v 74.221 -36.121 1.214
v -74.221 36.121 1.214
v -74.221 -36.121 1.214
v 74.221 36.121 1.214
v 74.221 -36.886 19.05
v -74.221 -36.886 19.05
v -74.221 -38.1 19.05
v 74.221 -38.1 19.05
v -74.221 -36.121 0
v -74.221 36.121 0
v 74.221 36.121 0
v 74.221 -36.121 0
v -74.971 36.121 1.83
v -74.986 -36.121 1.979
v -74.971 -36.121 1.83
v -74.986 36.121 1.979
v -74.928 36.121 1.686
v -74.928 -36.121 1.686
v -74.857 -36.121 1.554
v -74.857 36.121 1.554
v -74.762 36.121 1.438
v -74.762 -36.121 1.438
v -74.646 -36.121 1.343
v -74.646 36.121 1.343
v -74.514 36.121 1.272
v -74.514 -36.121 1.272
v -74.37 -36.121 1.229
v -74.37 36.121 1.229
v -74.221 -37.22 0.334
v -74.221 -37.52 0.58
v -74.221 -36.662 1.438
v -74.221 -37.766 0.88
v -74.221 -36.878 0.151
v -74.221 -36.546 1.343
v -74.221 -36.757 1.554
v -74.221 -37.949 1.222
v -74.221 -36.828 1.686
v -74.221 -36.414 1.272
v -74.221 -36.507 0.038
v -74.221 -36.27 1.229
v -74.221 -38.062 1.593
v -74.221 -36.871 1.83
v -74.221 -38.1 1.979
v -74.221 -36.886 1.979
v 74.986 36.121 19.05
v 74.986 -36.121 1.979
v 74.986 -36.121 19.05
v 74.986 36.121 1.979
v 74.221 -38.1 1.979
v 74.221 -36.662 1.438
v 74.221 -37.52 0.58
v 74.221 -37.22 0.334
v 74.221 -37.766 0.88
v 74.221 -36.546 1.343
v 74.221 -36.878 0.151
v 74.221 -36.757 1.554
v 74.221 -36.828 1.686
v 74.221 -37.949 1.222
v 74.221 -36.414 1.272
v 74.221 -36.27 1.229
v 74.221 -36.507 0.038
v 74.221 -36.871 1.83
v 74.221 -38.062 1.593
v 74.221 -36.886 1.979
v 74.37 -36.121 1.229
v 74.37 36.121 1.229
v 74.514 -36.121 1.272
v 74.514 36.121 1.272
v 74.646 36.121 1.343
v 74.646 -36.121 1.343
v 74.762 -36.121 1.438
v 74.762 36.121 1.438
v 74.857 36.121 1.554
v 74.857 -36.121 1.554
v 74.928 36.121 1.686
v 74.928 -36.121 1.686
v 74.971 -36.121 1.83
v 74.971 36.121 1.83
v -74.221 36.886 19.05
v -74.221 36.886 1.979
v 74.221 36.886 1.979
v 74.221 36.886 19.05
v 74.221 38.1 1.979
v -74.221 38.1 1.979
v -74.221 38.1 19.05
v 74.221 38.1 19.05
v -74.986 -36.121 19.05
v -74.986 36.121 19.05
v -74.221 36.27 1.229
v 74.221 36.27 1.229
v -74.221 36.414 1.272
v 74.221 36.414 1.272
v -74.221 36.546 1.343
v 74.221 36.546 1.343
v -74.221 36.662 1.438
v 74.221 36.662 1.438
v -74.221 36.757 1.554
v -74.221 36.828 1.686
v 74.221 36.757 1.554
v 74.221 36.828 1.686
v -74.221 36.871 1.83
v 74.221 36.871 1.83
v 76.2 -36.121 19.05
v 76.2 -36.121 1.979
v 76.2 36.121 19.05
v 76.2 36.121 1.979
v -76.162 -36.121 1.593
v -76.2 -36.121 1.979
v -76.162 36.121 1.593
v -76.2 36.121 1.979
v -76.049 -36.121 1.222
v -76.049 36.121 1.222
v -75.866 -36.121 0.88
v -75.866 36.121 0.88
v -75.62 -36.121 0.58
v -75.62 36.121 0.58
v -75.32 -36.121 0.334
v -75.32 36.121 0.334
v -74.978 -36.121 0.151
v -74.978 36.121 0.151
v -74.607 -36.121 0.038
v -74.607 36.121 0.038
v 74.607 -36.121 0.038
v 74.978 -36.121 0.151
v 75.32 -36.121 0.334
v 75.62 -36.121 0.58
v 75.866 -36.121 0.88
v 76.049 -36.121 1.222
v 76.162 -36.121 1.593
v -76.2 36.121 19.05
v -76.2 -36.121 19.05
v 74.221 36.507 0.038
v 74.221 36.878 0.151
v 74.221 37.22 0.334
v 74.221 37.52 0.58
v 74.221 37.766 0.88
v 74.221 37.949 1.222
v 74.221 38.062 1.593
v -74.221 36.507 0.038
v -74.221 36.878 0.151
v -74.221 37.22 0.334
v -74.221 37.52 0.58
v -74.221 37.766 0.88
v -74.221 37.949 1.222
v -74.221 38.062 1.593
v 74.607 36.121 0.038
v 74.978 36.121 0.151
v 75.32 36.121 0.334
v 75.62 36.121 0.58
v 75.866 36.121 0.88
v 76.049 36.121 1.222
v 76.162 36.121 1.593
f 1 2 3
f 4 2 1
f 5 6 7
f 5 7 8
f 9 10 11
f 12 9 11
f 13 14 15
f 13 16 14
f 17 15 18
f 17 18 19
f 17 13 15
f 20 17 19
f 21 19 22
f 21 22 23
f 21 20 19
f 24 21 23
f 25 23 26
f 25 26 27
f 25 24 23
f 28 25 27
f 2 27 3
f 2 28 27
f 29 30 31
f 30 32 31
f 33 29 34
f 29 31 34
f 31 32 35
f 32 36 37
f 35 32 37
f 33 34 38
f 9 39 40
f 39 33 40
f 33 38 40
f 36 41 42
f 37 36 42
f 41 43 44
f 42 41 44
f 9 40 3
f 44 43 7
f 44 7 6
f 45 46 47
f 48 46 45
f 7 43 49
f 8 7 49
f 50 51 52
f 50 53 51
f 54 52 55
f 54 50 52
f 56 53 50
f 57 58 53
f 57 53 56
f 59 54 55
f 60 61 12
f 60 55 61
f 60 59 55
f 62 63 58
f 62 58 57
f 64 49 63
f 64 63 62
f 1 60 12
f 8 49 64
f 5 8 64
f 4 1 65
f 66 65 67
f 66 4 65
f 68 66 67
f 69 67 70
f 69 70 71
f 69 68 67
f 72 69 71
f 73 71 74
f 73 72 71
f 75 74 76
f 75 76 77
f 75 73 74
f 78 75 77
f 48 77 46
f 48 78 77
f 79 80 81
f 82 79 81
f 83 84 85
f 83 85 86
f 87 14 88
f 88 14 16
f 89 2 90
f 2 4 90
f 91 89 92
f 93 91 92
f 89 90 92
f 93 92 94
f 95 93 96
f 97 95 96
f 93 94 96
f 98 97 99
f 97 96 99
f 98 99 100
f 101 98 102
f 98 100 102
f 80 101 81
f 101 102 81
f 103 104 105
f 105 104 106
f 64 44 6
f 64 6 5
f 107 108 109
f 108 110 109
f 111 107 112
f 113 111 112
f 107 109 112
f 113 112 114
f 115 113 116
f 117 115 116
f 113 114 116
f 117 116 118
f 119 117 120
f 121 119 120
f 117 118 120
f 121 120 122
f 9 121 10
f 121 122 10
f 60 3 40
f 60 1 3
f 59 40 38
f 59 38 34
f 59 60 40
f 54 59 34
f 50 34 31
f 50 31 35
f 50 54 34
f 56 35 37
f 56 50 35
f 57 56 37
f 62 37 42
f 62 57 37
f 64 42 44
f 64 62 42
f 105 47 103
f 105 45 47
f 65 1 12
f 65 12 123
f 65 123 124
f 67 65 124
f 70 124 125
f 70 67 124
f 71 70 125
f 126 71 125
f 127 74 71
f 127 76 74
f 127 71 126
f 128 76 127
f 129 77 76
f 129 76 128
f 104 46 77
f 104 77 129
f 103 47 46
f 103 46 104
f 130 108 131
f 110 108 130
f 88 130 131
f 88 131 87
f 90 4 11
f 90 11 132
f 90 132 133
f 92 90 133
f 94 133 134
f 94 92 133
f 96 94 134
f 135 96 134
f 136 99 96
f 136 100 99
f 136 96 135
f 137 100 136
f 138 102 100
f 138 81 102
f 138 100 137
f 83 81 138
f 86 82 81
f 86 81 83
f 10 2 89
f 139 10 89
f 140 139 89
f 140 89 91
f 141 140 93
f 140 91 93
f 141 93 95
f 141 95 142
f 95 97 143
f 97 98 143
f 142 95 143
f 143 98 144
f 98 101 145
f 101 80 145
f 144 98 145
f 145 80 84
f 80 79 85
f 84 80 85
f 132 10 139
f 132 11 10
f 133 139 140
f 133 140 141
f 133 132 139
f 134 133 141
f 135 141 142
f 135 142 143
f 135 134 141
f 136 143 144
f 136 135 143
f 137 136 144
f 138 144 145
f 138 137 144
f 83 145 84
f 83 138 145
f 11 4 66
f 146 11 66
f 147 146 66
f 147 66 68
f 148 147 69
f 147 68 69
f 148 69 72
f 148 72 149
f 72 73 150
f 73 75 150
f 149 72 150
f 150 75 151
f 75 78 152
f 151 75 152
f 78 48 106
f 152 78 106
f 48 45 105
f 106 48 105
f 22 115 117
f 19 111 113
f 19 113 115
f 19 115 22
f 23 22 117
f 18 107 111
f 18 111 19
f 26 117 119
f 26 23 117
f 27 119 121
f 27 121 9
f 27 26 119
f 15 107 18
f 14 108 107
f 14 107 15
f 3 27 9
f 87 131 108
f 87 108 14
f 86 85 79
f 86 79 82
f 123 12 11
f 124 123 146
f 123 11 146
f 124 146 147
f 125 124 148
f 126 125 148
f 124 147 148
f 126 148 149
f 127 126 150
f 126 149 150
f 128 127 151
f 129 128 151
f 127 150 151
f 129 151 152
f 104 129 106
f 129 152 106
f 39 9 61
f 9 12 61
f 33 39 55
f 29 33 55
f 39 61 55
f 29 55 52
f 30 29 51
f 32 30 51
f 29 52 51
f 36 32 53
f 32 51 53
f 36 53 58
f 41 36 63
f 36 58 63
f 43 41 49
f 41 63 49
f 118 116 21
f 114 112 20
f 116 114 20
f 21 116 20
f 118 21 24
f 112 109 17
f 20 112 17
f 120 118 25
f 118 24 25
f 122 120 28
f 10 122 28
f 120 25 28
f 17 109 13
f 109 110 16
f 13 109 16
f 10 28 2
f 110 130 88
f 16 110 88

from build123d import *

# Parameters (mm, degrees)
F0_W     = 152.4
F0_H     = 76.2
F1_DEPTH = 19.05
F2_T     = -1.21412
F3_W     = 1.9790156
F3_H     = 1.9790156
F4_DEPTH = 19.051
F5_R     = 0.7648956
F6_R     = 1.9790156


with BuildPart() as f1:
    # F0 (on Top) → F1 (new body)
    with BuildSketch(Plane.XY):
        Rectangle(F0_W, F0_H)
    extrude(amount=F1_DEPTH)

    # F2
    f2_openings = [f1.faces().sort_by_distance(p)[0] for p in [
        (0, 0, 19.05),
    ]]
    offset(amount=F2_T, openings=f2_openings)

    # F3 (on face) → F4 (cut, through all)
    with BuildSketch(Plane.XY.offset(19.05)):
        with Locations((-75.2104922, -37.1104922)):
            Rectangle(F3_W, F3_H)
        with Locations((-75.2104922, 37.1104922)):
            Rectangle(F3_W, F3_H)
        with Locations((75.2104922, -37.1104922)):
            Rectangle(F3_W, F3_H)
        with Locations((75.2104922, 37.1104922)):
            Rectangle(F3_W, F3_H)
    extrude(amount=-F4_DEPTH, mode=Mode.SUBTRACT)

    # F5
    f5_edges = [f1.edges().sort_by_distance(p)[0] for p in [
        (-74.98588, 0, 1.21412),
        (0, 36.88588, 1.21412),
        (0, -36.88588, 1.21412),
        (74.98588, 0, 1.21412),
    ]]
    fillet(f5_edges, radius=F5_R)

    # F6
    f6_edges = [f1.edges().sort_by_distance(p)[0] for p in [
        (0, 38.1, 0),
        (-76.2, 0, 0),
        (76.2, 0, 0),
        (0, -38.1, 0),
    ]]
    fillet(f6_edges, radius=F6_R)


solid = f1.part
